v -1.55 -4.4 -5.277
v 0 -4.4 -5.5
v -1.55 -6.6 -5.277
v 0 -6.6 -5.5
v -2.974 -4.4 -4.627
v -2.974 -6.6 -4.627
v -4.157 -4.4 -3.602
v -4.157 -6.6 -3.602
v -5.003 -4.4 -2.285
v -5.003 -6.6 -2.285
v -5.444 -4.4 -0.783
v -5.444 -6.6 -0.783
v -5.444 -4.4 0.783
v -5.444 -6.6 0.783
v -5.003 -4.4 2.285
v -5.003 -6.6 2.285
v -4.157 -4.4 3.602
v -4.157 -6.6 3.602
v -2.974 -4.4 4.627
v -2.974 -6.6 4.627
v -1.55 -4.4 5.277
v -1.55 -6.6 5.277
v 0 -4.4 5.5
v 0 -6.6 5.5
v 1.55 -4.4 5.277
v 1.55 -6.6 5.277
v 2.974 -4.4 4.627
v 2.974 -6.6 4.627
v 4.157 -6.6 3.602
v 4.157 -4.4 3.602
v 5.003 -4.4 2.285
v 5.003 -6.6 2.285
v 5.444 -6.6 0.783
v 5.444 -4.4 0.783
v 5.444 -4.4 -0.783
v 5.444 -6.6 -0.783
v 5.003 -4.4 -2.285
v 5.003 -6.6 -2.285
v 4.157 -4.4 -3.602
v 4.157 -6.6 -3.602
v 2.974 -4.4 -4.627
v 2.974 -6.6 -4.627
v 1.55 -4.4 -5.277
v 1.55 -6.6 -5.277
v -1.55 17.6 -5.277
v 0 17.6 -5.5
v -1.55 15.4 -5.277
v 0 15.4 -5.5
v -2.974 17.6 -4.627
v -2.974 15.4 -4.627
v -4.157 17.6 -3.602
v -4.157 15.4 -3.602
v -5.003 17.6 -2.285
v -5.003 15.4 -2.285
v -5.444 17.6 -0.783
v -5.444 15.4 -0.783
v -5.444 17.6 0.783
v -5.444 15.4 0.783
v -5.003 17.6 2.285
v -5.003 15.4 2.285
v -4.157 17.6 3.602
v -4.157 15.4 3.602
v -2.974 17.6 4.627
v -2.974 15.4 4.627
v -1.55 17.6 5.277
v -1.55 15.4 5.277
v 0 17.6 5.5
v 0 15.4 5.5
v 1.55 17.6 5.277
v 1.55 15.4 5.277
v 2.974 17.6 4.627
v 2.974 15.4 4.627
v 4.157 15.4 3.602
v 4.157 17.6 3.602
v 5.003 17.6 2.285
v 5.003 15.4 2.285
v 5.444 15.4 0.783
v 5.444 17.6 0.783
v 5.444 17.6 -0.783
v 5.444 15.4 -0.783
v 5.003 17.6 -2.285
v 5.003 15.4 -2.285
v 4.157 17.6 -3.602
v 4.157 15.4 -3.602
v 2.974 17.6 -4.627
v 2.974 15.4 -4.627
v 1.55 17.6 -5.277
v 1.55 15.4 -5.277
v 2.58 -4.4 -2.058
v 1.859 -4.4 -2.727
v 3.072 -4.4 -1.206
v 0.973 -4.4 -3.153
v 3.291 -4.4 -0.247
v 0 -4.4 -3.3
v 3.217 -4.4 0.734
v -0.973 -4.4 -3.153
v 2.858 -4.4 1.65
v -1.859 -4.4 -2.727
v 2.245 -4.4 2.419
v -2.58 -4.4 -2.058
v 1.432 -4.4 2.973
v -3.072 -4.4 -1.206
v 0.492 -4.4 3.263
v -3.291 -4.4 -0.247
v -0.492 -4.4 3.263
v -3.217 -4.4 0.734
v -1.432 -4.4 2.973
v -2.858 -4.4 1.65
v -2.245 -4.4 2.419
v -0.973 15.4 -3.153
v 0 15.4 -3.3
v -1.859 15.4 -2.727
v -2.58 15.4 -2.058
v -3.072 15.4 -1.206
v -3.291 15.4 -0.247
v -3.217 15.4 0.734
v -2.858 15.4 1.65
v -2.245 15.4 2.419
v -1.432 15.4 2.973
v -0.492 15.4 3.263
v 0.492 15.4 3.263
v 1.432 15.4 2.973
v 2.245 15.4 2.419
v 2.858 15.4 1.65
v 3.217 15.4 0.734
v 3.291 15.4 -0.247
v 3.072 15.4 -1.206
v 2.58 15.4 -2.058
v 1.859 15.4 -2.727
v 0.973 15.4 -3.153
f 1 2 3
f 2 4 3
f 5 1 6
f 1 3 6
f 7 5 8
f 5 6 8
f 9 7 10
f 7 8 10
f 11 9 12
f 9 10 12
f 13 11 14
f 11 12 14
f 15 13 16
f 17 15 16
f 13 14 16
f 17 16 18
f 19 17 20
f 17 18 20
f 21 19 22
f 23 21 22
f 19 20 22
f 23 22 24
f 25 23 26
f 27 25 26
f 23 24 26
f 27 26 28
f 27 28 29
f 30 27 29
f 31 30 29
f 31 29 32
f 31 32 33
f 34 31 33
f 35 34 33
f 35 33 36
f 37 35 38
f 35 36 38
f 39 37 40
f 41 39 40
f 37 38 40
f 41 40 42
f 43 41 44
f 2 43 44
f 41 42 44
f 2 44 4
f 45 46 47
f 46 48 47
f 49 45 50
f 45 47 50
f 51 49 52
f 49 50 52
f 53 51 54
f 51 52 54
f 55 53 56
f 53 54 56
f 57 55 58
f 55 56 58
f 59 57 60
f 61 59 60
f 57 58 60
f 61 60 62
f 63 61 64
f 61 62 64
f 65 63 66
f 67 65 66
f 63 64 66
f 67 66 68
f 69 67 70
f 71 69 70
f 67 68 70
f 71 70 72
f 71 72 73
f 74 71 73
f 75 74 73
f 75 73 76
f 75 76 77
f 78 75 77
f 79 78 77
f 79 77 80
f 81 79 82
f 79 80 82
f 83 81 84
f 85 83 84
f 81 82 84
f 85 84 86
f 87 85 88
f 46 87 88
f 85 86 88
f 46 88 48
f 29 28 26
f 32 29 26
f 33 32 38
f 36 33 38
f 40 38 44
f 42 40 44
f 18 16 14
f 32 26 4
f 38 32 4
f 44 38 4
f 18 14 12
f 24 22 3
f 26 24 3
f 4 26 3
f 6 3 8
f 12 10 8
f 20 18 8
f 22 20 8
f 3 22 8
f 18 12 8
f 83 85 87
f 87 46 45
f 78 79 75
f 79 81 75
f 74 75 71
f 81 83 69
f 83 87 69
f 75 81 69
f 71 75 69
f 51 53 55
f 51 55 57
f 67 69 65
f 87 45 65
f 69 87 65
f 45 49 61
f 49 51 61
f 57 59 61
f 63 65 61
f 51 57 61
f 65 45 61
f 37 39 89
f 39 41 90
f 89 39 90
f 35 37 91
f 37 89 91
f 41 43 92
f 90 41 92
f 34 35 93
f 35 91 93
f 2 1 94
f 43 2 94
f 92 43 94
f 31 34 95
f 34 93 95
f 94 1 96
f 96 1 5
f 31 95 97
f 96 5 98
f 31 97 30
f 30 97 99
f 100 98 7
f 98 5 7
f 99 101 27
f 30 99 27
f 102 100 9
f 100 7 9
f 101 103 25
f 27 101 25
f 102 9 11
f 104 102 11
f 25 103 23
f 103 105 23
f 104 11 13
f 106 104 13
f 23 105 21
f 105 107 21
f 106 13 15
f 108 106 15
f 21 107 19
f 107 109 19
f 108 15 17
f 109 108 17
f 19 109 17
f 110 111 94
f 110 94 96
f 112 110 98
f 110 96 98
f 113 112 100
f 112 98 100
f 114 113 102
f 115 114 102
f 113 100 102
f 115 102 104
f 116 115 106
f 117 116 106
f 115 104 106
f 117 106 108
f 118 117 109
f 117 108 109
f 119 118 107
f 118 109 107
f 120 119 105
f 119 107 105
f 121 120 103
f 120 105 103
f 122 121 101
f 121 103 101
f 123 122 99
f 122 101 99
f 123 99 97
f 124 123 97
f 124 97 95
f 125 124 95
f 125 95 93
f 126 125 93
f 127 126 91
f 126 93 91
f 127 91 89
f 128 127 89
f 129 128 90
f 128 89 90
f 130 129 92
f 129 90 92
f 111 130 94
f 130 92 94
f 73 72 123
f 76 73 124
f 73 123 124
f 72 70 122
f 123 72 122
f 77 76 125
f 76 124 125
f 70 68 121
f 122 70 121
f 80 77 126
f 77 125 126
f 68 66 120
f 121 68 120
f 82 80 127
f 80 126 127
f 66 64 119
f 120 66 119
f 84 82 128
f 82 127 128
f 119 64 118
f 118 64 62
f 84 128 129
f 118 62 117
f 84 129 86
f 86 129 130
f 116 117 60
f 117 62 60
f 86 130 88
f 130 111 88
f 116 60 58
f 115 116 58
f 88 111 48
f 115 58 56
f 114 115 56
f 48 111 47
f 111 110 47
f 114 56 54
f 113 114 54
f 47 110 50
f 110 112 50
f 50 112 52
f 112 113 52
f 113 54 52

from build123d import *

# Parameters (mm, degrees)
SCALE_1_SCALE = 2.2


with BuildPart() as part:
    # Эскиз1 → Повернуть1 (revolve)
    with BuildSketch(Plane.XY, mode=Mode.PRIVATE) as revolve_1_sk:
        Polygon((0, 0), (0, 11), (-2.5, 11), (-2.5, 10), (-1.5, 10), (-1.5, 1), (-2.5, 1), (-2.5, 0), align=None)
    revolve(revolve_1_sk.sketch.rotate(Axis((0, 0, 0), (0, 1, 0)), 270), axis=Axis((0, 0, 0), (0, 1, 0)))


with BuildPart() as part_1:
    # Масштаб1: scaled about (0, 5.5, 0)
    add(part.part.scale(SCALE_1_SCALE).moved(Location((0, -6.6, 0))))


solid = part_1.part
